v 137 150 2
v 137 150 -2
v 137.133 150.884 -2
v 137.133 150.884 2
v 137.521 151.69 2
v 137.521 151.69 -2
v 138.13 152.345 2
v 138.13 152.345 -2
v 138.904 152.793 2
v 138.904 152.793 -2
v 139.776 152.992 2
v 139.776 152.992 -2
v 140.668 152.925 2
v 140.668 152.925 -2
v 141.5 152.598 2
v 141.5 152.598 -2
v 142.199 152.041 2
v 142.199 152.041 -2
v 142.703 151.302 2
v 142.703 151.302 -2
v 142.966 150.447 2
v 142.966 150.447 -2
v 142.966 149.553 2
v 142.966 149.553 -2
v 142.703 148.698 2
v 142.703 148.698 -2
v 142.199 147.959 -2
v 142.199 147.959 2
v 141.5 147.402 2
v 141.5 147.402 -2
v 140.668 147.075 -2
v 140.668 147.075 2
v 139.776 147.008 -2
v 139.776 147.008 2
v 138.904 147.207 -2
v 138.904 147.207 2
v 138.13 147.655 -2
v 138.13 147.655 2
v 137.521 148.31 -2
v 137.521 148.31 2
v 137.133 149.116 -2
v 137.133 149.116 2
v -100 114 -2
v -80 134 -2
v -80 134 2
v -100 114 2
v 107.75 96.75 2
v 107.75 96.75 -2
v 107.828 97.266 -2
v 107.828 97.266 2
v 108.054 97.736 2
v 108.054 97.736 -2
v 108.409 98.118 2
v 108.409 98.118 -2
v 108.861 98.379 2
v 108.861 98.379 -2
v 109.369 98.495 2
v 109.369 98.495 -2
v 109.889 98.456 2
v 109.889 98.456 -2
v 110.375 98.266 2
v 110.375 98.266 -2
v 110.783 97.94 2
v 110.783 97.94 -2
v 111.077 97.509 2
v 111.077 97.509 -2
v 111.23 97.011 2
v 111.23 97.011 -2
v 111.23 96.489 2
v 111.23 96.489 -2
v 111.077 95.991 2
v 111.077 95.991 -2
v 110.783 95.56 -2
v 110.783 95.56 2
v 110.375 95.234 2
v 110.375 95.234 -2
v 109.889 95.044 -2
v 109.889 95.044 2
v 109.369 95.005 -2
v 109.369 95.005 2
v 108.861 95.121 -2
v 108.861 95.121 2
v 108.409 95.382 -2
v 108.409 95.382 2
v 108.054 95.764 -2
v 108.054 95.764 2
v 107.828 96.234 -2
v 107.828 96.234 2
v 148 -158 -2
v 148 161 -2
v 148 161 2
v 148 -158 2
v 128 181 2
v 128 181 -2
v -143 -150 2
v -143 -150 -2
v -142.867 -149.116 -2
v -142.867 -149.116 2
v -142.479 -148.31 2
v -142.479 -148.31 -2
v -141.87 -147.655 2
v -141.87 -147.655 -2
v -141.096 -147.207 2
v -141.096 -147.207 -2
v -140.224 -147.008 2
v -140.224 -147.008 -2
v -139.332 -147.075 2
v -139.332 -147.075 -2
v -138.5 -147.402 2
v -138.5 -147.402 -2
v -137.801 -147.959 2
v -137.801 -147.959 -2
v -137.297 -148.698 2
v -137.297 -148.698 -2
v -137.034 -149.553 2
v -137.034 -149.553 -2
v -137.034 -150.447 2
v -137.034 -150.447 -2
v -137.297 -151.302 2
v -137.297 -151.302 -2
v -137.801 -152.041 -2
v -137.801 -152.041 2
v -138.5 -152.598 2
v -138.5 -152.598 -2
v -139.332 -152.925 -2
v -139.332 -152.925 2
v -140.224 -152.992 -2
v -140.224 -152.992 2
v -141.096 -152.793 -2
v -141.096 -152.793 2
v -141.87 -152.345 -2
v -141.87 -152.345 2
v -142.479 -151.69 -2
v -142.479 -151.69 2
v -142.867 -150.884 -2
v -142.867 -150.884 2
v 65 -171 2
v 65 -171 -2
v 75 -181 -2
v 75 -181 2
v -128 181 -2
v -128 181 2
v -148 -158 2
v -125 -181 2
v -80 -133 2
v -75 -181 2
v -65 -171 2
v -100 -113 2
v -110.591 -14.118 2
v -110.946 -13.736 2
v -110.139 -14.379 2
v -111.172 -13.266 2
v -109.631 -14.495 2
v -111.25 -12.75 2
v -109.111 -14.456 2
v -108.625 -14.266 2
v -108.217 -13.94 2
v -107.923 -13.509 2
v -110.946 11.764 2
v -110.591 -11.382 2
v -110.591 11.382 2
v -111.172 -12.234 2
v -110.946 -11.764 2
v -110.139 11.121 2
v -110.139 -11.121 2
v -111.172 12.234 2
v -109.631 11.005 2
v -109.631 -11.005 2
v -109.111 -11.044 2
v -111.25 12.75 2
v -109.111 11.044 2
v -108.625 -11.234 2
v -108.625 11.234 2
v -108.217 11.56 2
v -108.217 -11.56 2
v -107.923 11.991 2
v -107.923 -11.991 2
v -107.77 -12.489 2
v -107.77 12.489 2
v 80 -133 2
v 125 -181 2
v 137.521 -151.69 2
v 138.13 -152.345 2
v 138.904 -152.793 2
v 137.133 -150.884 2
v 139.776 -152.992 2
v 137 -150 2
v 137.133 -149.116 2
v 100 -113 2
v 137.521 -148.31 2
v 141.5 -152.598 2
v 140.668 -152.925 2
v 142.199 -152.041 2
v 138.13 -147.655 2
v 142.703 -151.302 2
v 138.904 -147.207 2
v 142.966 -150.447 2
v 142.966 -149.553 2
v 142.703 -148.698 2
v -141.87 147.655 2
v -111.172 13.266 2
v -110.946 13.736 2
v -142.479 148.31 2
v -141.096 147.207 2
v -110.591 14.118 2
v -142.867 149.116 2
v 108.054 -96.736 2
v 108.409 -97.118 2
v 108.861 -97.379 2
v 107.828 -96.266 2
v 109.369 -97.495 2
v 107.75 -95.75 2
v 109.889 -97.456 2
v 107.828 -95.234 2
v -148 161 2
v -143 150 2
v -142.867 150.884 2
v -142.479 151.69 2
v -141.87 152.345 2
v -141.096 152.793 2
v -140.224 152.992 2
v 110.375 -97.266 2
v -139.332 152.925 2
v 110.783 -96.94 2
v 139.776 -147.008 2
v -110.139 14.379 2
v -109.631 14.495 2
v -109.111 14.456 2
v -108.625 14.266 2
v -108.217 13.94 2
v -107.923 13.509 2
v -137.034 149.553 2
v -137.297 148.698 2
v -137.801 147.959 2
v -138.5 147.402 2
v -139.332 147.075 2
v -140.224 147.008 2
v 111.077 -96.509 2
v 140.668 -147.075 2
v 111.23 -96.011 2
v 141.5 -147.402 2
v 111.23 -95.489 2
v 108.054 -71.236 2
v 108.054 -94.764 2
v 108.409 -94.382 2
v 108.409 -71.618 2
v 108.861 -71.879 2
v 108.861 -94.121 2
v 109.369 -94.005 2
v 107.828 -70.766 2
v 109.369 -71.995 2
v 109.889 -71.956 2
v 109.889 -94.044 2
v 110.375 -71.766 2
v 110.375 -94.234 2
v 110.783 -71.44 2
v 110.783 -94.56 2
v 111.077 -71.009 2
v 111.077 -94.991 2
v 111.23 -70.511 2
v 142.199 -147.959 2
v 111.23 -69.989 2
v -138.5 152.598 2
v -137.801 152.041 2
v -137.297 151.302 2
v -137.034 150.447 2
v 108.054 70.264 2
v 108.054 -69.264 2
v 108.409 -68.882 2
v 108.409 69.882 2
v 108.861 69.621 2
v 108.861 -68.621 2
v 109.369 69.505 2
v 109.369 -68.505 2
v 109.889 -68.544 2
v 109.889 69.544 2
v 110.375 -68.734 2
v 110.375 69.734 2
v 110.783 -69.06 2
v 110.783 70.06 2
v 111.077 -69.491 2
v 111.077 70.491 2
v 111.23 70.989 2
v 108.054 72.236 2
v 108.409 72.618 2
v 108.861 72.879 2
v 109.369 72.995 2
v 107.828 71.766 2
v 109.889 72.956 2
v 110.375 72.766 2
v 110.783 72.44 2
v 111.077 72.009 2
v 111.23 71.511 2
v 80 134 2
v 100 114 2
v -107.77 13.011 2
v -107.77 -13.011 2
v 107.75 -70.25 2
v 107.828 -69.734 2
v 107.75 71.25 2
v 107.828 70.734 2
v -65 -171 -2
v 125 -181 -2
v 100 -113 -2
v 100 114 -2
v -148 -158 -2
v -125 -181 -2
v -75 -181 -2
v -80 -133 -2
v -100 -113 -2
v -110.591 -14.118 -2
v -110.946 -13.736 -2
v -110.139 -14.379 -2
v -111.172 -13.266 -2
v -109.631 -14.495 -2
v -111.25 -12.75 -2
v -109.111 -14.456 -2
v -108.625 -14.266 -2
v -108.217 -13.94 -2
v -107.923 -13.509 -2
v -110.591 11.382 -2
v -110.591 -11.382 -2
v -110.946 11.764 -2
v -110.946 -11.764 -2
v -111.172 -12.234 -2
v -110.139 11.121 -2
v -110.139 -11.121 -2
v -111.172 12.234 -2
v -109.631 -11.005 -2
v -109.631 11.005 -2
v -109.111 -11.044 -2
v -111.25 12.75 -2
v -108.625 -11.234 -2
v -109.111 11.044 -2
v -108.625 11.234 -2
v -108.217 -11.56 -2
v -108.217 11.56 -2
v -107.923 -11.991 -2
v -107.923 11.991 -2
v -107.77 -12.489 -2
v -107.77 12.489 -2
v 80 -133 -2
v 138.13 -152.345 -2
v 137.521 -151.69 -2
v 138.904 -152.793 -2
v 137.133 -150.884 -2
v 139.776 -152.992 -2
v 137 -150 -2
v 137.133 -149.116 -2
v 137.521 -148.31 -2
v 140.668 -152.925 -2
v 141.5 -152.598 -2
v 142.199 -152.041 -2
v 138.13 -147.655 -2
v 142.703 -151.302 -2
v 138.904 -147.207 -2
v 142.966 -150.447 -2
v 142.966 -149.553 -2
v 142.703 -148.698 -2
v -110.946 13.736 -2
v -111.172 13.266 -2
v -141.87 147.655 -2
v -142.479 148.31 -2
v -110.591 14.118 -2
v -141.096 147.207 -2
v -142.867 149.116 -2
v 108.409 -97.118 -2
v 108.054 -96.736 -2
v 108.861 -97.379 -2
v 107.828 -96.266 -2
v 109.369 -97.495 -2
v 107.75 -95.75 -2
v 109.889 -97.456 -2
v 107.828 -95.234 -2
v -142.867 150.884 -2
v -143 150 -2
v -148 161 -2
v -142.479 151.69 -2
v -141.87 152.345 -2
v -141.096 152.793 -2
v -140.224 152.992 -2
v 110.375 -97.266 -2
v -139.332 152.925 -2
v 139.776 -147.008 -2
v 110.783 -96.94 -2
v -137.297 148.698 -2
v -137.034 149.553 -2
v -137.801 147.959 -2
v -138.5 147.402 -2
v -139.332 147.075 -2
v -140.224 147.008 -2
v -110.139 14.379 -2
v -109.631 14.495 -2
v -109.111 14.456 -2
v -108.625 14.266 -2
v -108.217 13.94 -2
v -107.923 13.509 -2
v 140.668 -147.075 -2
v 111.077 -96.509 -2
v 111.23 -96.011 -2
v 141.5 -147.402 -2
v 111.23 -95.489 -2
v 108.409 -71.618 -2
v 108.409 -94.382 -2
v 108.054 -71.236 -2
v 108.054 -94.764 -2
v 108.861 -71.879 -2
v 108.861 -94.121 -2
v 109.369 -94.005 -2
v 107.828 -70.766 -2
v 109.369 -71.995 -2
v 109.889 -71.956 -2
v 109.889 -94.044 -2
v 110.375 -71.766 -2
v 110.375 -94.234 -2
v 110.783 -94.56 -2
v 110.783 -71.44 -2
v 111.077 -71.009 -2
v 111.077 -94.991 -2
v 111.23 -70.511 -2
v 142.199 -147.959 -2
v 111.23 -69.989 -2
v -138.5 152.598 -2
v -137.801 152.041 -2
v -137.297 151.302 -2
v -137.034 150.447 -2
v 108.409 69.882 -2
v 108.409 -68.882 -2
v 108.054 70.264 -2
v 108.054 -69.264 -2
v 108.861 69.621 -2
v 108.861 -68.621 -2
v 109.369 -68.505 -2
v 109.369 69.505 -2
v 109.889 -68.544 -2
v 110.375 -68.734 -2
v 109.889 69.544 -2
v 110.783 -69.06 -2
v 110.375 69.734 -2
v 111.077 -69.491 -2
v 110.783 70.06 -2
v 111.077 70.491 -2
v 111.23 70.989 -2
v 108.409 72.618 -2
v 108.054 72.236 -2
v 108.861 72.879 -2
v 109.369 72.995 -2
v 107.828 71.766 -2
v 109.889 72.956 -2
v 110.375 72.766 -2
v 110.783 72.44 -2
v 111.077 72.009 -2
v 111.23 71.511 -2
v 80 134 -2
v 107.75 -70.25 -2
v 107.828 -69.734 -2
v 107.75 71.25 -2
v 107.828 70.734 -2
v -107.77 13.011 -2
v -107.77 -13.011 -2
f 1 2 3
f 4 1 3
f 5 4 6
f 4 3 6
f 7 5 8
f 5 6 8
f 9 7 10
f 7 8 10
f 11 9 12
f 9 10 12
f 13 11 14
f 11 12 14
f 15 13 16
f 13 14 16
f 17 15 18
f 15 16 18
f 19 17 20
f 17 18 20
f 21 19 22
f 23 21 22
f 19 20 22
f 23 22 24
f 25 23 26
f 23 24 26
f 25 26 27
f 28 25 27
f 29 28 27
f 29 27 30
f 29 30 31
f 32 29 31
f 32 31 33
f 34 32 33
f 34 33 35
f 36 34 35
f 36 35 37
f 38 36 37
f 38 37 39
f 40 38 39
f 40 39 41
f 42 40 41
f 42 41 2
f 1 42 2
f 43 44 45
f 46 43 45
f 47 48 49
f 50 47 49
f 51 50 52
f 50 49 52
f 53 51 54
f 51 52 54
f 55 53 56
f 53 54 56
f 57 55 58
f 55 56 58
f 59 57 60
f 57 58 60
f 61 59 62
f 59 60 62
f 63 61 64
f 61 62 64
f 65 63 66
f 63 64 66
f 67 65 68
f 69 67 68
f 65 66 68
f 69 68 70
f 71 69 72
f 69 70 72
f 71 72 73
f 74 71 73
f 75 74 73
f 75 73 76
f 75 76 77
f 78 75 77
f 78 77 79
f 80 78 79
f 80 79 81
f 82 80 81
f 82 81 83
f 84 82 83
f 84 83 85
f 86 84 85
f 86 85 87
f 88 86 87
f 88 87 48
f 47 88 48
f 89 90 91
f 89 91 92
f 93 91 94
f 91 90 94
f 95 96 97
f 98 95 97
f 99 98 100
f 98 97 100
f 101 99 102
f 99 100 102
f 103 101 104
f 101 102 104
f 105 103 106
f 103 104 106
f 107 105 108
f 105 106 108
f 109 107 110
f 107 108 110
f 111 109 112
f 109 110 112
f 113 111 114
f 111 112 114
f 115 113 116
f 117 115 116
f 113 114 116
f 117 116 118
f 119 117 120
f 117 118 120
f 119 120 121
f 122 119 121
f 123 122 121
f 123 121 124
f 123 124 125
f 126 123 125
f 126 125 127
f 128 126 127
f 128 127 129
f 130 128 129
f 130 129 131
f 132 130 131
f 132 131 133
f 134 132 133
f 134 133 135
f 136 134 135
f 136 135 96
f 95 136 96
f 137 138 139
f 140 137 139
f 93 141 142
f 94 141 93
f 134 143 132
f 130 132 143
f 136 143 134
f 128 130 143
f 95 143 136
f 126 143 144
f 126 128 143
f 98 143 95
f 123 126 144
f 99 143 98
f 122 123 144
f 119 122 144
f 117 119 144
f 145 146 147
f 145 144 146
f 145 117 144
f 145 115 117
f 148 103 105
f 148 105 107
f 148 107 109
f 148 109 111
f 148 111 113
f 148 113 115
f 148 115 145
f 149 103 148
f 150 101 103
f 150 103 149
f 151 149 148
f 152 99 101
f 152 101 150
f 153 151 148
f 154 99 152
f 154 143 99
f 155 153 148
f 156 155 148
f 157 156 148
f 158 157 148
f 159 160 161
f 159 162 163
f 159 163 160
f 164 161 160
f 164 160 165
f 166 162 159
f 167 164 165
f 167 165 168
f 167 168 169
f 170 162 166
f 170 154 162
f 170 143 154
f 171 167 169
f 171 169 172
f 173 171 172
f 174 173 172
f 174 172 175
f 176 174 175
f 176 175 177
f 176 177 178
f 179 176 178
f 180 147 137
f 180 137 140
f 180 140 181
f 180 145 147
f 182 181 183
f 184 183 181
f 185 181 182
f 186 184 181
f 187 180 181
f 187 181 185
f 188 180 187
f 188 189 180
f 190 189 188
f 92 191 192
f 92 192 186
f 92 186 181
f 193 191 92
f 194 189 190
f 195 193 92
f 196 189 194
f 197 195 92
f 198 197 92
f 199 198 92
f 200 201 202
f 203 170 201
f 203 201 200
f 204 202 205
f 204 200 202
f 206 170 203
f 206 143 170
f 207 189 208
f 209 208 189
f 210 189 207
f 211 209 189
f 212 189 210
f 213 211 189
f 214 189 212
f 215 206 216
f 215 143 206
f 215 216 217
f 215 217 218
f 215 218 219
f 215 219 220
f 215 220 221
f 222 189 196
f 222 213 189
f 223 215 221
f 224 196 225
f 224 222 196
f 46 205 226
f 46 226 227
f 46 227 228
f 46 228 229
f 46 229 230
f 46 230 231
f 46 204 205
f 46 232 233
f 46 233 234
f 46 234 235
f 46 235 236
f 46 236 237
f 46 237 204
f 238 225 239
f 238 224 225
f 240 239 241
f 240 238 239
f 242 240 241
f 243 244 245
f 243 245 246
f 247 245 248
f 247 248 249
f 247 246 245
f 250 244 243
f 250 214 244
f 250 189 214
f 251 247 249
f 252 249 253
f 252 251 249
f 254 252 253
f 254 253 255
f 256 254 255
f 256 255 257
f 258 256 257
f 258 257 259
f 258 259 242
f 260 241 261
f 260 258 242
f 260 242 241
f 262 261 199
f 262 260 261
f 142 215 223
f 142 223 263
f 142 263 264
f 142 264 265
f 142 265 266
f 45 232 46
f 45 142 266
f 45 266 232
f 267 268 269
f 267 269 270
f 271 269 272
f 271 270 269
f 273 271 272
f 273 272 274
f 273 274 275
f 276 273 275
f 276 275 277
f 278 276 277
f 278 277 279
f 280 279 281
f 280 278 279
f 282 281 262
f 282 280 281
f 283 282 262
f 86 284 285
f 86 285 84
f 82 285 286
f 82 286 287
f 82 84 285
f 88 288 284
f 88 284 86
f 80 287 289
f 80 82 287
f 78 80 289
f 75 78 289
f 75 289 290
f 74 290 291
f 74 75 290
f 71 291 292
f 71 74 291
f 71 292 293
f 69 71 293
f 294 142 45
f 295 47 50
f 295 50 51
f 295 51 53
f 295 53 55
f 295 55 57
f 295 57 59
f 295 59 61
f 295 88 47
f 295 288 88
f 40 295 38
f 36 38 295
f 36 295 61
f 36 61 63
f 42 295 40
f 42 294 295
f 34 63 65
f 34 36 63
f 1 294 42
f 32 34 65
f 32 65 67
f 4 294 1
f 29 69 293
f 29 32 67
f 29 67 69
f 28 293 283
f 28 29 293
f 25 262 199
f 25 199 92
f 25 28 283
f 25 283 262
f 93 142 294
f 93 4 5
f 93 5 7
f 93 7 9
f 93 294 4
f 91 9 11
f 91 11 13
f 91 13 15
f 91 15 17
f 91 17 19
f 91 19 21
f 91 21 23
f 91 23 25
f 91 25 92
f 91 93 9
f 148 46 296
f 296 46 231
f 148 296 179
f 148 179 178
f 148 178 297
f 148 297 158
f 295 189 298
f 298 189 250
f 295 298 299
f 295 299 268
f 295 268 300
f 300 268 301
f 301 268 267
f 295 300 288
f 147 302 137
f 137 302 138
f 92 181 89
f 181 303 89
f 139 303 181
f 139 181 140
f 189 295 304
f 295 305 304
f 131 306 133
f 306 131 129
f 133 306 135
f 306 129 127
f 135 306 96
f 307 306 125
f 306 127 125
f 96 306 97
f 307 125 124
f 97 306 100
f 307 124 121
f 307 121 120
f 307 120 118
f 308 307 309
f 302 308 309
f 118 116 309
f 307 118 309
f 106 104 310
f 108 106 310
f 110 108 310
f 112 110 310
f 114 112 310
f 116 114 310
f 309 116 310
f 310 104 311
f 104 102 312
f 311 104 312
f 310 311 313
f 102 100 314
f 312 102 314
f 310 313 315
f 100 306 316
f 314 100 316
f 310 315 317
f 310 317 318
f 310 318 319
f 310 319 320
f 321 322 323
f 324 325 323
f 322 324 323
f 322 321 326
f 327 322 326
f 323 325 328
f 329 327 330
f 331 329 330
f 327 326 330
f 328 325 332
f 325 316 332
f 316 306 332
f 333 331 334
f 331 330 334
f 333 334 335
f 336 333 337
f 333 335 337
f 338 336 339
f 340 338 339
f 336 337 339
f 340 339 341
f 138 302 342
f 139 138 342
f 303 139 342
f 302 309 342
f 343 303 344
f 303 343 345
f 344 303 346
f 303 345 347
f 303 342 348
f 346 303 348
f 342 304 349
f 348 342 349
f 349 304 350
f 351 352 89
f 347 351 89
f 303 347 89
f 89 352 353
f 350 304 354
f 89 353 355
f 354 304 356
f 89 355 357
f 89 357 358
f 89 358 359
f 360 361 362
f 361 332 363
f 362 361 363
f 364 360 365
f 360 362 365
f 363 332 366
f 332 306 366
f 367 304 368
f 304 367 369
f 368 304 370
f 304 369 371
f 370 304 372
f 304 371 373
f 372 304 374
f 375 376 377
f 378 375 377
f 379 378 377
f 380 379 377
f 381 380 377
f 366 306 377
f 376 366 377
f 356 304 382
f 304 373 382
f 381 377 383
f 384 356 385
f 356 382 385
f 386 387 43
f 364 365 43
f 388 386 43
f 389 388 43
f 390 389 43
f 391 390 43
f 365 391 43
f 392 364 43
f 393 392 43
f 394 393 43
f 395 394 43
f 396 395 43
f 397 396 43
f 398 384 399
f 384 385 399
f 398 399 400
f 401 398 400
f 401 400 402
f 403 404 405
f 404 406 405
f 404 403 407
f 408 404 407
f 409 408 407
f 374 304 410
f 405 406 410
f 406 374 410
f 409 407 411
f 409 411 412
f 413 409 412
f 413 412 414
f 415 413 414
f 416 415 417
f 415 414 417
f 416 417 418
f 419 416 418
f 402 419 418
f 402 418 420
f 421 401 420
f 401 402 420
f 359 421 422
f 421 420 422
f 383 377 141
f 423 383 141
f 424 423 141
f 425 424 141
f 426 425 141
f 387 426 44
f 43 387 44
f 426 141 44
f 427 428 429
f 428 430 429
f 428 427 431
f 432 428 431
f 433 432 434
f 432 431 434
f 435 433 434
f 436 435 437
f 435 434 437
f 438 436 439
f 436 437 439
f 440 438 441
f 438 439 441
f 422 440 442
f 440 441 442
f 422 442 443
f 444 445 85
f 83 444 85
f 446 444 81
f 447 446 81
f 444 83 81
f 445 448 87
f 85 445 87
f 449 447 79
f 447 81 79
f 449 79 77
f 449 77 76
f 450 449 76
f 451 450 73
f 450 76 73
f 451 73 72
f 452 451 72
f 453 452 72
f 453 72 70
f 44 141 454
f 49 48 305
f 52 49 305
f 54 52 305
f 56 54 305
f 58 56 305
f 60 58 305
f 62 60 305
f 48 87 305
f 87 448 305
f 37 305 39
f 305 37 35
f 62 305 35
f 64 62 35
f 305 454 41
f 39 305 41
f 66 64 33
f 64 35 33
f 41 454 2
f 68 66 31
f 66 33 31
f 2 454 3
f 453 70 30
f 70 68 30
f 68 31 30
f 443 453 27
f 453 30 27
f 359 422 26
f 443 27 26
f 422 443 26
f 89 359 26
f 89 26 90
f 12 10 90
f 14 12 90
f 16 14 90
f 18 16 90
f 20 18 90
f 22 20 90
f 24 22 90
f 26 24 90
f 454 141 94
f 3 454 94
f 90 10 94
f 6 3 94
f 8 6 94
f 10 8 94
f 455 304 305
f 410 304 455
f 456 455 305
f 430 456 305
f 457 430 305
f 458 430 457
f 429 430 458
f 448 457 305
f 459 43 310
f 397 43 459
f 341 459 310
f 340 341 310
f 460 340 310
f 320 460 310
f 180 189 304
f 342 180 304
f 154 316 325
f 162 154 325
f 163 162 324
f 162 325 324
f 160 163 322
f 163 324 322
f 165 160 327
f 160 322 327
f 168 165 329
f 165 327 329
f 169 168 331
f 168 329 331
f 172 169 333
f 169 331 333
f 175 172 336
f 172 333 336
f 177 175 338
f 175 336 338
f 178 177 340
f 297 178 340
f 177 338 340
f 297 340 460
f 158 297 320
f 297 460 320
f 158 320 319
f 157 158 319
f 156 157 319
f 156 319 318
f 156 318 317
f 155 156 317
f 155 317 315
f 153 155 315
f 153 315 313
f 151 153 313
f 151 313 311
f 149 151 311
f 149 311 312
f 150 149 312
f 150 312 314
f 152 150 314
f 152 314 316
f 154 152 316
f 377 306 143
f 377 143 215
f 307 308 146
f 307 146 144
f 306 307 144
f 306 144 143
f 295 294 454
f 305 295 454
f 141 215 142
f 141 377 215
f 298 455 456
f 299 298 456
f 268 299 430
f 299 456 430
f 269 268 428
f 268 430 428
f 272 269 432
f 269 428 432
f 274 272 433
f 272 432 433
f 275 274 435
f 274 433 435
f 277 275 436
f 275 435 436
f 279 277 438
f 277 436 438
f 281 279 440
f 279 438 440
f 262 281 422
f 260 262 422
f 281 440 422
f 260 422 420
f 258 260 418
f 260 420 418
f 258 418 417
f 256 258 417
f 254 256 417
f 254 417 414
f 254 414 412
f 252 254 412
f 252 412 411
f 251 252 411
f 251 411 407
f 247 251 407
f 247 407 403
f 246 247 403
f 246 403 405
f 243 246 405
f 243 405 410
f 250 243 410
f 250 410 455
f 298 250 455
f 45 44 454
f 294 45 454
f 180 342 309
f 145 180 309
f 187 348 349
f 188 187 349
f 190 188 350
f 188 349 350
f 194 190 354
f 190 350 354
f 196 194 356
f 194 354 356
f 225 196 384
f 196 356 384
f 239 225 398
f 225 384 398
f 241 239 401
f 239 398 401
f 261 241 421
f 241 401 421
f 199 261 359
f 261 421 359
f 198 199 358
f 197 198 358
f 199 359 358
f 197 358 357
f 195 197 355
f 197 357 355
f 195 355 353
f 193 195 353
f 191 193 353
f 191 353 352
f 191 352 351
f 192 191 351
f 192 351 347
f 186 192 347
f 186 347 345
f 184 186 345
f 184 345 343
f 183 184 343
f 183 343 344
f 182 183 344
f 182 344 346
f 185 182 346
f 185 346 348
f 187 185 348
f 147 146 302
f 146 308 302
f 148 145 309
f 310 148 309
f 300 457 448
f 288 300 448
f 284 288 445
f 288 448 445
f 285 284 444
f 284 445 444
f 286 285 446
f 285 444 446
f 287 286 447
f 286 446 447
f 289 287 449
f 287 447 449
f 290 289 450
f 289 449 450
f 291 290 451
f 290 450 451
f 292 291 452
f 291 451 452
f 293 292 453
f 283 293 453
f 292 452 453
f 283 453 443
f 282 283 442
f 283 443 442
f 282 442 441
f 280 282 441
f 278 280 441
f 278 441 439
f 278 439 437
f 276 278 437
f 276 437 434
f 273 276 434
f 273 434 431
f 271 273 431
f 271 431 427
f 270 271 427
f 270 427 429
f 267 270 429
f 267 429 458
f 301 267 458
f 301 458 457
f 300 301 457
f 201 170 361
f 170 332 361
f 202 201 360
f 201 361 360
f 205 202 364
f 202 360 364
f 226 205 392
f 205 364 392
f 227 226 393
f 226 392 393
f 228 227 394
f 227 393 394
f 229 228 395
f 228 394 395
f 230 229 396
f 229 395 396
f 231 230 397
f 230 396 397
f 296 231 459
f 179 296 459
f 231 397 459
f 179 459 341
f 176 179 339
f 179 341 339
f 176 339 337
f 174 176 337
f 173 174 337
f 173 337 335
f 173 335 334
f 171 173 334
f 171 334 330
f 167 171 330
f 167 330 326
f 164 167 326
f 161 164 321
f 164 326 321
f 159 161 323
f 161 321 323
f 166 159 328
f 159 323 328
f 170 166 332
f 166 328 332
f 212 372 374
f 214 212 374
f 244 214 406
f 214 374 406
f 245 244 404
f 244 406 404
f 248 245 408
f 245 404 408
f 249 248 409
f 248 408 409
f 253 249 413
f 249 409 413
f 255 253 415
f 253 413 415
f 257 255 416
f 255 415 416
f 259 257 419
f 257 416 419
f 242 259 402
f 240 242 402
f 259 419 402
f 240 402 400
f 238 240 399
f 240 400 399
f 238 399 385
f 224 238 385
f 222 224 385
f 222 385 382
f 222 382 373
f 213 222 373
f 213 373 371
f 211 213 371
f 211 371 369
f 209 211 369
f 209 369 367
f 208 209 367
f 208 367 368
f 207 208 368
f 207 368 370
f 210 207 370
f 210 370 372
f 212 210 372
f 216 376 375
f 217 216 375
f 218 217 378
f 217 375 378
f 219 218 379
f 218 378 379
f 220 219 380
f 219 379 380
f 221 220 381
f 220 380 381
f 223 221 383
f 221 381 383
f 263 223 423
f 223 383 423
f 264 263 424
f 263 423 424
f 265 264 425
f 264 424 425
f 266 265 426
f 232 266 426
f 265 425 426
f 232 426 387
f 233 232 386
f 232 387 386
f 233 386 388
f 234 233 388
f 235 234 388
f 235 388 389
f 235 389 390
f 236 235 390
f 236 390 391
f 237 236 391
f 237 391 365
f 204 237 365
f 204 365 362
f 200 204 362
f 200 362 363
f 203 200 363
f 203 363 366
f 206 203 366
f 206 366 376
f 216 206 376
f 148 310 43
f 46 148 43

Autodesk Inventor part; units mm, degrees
ref_plane "YZ Plane" through (0, 0, 0) normal (1, 0, 0) x (0, 1, 0)
ref_plane "XZ Plane" through (0, 0, 0) normal (0, 1, 0) x (-1, 0, 0)
ref_plane "XY Plane" through (0, 0, 0) normal (0, 0, 1) x (1, 0, 0)
sketch "Hinges" plane through (0, 0, 0) normal (0, 0, 1) x (1, 0, 0)
  circle A0 centre (-464.8647, 95.9101) radius 1.75
  circle A1 centre (-464.8647, 121.4101) radius 1.75
  line L0 (-471.3647, 88.6601) -> (-455.3647, 88.6601)
  line L1 (-455.3647, 88.6601) -> (-455.3647, 128.6601)
  line L2 (-455.3647, 128.6601) -> (-471.3647, 128.6601)
  line L3 (-471.3647, 128.6601) -> (-471.3647, 88.6601)
  circle A2 centre (-439.8647, 121.4101) radius 1.75
  circle A3 centre (-439.8647, 95.9101) radius 1.75
  line L4 (-433.3647, 128.6601) -> (-449.3647, 128.6601)
  line L5 (-449.3647, 128.6601) -> (-449.3647, 88.6601)
  line L6 (-449.3647, 88.6601) -> (-433.3647, 88.6601)
  line L7 (-433.3647, 88.6601) -> (-433.3647, 128.6601)
  point P0 (-452.3647, 108.6601)
  dimension "d30" = 3.5
  dimension "d31" = 25.5
  dimension "d32" = 6.5
  dimension "d33" = 40
  dimension "d34" = 7.25
  dimension "d35" = 16
  dimension "d36" = 3.5
  dimension "d37" = 25.5
  dimension "d38" = 6.5
  dimension "d39" = 40
  dimension "d40" = 7.25
  dimension "d41" = 16
  dimension "d42" = 38
sketch "Sketch1" plane through (0, 0, 0) normal (0, 0, 1) x (1, 0, 0)
  line L0 (-148, 181) -> (148, 181)
  line L1 (148, 181) -> (148, -181)
  line L2 (148, -181) -> (-148, -181)
  line L3 (-148, -181) -> (-148, 181)
  line L4 (-75, -181) -> (-65, -171)
  line L5 (-75, -181) -> (-60.8579, -181) construction
  line L6 (-65, -171) -> (65, -171)
  line L7 (65, -171) -> (75, -181)
  line L8 (-125, -181) -> (-148, -158)
  line L9 (-125, -181) -> (-92.4731, -181) construction
  line L10 (125, -181) -> (148, -158)
  line L11 (125, -181) -> (157.5269, -181) construction
  line L12 (-148, 161) -> (-128, 181)
  line L13 (-148, 161) -> (-119.7157, 161) construction
  line L14 (148, 161) -> (128, 181)
  line L15 (-100, 134) -> (100, 134)
  line L16 (100, 134) -> (100, -133)
  line L17 (100, -133) -> (-100, -133)
  line L18 (-100, -133) -> (-100, 134)
  point P0 (0, 0)
  point P1 (0, 181)
  point P2 (-148, 0)
  point P3 (0, -171)
  point P4 (0, 134)
  dimension "d0" = 296
  dimension "d1" = 362
  dimension "d2" = 45
  dimension "d3" = 10
  dimension "d4" = 150
  dimension "d5" = 135
  dimension "d6" = 50
  dimension "d7" = 45
  dimension "d8" = 50
  dimension "d9" = 45
  dimension "d10" = 20
  dimension "d11" = 20
  dimension "d12" = 135
  dimension "d13" = 47
  dimension "d14" = 200
  dimension "d15" = 267
extrude "Extrusion1" add sketch "Sketch1" along normal mid plane 4 contours L0 L14 L1 L10 L2 L7 L6 L4 L8 L3 L12
chamfer "Chamfer1" distance 20 angle 45 4 edges at (-100, 134, 0) (100, 134, 0) (-100, -133, 0) (100, -133, 0)
sketch "Sketch3" plane through (0, 0, -2) normal (0, 0, -1) x (-1, 0, 0)
  circle A0 centre (-140, 150) radius 3
  circle A1 centre (-140, -150) radius 3
  circle A2 centre (140, -150) radius 3
  circle A3 centre (140, 150) radius 3
  line L0 (-148, 161) -> (-148, -158) projected
  line L1 (148, -158) -> (148, 161) projected
  point P0 (0, 0)
  dimension "d25" = 6
  dimension "d26" = 300
  dimension "d27" = 150
  dimension "d47" = 8
  dimension "d48" = 8
extrude "Extrusion3" cut sketch "Sketch3" against normal blind 37.5
sketch "Sketch4" plane through (0, 0, -2) normal (0, 0, -1) x (-1, 0, 0)
  line L0 (-100, -113) -> (-100, 114) projected
  line L1 (100, 114) -> (100, -113) projected
  circle A0 centre (-109.5, 71.25) radius 1.75
  circle A1 centre (-109.5, 96.75) radius 1.75
  line L2 (-116, 64) -> (-100, 64)
  line L3 (-100, 64) -> (-100, 104)
  line L4 (-100, 104) -> (-116, 104)
  line L5 (-116, 104) -> (-116, 64)
  circle A2 centre (-84.5, 96.75) radius 1.75
  circle A3 centre (-84.5, 71.25) radius 1.75
  line L6 (-78, 104) -> (-94, 104)
  line L7 (-94, 104) -> (-94, 64)
  line L8 (-94, 64) -> (-78, 64)
  line L9 (-78, 64) -> (-78, 104)
  circle A4 centre (-109.5, -95.75) radius 1.75
  circle A5 centre (-109.5, -70.25) radius 1.75
  line L10 (-116, -103) -> (-100, -103)
  line L11 (-100, -103) -> (-100, -63)
  line L12 (-100, -63) -> (-116, -63)
  line L13 (-116, -63) -> (-116, -103)
  circle A6 centre (-84.5, -70.25) radius 1.75
  circle A7 centre (-84.5, -95.75) radius 1.75
  line L14 (-78, -63) -> (-94, -63)
  line L15 (-94, -63) -> (-94, -103)
  line L16 (-94, -103) -> (-78, -103)
  line L17 (-78, -103) -> (-78, -63)
  circle A8 centre (84.5, -12.75) radius 1.75
  circle A9 centre (84.5, 12.75) radius 1.75
  line L18 (78, -20) -> (94, -20)
  line L19 (94, -20) -> (94, 20)
  line L20 (94, 20) -> (78, 20)
  line L21 (78, 20) -> (78, -20)
  circle A10 centre (109.5, 12.75) radius 1.75
  circle A11 centre (109.5, -12.75) radius 1.75
  line L22 (116, 20) -> (100, 20)
  line L23 (100, 20) -> (100, -20)
  line L24 (100, -20) -> (116, -20)
  line L25 (116, -20) -> (116, 20)
  point P0 (0, 0)
  point P1 (100, 0)
  dimension "d43" = 10
  dimension "d44" = 10
extrude "Extrusion4" cut sketch "Sketch4" against normal blind 10 contours A0 | A1 | A4 | A5 | A10 | A11
equation "\"d27\" = 0.5 * d26"
equation "\"d34\" = -0.5 * d31 + 0.5 * d33"
equation "\"d40\" = -0.5 * d37 + 0.5 * d39"
equation "\"d8\" = d6"
properties part number "Right Sides Cover" material "Wood (Birch)"
